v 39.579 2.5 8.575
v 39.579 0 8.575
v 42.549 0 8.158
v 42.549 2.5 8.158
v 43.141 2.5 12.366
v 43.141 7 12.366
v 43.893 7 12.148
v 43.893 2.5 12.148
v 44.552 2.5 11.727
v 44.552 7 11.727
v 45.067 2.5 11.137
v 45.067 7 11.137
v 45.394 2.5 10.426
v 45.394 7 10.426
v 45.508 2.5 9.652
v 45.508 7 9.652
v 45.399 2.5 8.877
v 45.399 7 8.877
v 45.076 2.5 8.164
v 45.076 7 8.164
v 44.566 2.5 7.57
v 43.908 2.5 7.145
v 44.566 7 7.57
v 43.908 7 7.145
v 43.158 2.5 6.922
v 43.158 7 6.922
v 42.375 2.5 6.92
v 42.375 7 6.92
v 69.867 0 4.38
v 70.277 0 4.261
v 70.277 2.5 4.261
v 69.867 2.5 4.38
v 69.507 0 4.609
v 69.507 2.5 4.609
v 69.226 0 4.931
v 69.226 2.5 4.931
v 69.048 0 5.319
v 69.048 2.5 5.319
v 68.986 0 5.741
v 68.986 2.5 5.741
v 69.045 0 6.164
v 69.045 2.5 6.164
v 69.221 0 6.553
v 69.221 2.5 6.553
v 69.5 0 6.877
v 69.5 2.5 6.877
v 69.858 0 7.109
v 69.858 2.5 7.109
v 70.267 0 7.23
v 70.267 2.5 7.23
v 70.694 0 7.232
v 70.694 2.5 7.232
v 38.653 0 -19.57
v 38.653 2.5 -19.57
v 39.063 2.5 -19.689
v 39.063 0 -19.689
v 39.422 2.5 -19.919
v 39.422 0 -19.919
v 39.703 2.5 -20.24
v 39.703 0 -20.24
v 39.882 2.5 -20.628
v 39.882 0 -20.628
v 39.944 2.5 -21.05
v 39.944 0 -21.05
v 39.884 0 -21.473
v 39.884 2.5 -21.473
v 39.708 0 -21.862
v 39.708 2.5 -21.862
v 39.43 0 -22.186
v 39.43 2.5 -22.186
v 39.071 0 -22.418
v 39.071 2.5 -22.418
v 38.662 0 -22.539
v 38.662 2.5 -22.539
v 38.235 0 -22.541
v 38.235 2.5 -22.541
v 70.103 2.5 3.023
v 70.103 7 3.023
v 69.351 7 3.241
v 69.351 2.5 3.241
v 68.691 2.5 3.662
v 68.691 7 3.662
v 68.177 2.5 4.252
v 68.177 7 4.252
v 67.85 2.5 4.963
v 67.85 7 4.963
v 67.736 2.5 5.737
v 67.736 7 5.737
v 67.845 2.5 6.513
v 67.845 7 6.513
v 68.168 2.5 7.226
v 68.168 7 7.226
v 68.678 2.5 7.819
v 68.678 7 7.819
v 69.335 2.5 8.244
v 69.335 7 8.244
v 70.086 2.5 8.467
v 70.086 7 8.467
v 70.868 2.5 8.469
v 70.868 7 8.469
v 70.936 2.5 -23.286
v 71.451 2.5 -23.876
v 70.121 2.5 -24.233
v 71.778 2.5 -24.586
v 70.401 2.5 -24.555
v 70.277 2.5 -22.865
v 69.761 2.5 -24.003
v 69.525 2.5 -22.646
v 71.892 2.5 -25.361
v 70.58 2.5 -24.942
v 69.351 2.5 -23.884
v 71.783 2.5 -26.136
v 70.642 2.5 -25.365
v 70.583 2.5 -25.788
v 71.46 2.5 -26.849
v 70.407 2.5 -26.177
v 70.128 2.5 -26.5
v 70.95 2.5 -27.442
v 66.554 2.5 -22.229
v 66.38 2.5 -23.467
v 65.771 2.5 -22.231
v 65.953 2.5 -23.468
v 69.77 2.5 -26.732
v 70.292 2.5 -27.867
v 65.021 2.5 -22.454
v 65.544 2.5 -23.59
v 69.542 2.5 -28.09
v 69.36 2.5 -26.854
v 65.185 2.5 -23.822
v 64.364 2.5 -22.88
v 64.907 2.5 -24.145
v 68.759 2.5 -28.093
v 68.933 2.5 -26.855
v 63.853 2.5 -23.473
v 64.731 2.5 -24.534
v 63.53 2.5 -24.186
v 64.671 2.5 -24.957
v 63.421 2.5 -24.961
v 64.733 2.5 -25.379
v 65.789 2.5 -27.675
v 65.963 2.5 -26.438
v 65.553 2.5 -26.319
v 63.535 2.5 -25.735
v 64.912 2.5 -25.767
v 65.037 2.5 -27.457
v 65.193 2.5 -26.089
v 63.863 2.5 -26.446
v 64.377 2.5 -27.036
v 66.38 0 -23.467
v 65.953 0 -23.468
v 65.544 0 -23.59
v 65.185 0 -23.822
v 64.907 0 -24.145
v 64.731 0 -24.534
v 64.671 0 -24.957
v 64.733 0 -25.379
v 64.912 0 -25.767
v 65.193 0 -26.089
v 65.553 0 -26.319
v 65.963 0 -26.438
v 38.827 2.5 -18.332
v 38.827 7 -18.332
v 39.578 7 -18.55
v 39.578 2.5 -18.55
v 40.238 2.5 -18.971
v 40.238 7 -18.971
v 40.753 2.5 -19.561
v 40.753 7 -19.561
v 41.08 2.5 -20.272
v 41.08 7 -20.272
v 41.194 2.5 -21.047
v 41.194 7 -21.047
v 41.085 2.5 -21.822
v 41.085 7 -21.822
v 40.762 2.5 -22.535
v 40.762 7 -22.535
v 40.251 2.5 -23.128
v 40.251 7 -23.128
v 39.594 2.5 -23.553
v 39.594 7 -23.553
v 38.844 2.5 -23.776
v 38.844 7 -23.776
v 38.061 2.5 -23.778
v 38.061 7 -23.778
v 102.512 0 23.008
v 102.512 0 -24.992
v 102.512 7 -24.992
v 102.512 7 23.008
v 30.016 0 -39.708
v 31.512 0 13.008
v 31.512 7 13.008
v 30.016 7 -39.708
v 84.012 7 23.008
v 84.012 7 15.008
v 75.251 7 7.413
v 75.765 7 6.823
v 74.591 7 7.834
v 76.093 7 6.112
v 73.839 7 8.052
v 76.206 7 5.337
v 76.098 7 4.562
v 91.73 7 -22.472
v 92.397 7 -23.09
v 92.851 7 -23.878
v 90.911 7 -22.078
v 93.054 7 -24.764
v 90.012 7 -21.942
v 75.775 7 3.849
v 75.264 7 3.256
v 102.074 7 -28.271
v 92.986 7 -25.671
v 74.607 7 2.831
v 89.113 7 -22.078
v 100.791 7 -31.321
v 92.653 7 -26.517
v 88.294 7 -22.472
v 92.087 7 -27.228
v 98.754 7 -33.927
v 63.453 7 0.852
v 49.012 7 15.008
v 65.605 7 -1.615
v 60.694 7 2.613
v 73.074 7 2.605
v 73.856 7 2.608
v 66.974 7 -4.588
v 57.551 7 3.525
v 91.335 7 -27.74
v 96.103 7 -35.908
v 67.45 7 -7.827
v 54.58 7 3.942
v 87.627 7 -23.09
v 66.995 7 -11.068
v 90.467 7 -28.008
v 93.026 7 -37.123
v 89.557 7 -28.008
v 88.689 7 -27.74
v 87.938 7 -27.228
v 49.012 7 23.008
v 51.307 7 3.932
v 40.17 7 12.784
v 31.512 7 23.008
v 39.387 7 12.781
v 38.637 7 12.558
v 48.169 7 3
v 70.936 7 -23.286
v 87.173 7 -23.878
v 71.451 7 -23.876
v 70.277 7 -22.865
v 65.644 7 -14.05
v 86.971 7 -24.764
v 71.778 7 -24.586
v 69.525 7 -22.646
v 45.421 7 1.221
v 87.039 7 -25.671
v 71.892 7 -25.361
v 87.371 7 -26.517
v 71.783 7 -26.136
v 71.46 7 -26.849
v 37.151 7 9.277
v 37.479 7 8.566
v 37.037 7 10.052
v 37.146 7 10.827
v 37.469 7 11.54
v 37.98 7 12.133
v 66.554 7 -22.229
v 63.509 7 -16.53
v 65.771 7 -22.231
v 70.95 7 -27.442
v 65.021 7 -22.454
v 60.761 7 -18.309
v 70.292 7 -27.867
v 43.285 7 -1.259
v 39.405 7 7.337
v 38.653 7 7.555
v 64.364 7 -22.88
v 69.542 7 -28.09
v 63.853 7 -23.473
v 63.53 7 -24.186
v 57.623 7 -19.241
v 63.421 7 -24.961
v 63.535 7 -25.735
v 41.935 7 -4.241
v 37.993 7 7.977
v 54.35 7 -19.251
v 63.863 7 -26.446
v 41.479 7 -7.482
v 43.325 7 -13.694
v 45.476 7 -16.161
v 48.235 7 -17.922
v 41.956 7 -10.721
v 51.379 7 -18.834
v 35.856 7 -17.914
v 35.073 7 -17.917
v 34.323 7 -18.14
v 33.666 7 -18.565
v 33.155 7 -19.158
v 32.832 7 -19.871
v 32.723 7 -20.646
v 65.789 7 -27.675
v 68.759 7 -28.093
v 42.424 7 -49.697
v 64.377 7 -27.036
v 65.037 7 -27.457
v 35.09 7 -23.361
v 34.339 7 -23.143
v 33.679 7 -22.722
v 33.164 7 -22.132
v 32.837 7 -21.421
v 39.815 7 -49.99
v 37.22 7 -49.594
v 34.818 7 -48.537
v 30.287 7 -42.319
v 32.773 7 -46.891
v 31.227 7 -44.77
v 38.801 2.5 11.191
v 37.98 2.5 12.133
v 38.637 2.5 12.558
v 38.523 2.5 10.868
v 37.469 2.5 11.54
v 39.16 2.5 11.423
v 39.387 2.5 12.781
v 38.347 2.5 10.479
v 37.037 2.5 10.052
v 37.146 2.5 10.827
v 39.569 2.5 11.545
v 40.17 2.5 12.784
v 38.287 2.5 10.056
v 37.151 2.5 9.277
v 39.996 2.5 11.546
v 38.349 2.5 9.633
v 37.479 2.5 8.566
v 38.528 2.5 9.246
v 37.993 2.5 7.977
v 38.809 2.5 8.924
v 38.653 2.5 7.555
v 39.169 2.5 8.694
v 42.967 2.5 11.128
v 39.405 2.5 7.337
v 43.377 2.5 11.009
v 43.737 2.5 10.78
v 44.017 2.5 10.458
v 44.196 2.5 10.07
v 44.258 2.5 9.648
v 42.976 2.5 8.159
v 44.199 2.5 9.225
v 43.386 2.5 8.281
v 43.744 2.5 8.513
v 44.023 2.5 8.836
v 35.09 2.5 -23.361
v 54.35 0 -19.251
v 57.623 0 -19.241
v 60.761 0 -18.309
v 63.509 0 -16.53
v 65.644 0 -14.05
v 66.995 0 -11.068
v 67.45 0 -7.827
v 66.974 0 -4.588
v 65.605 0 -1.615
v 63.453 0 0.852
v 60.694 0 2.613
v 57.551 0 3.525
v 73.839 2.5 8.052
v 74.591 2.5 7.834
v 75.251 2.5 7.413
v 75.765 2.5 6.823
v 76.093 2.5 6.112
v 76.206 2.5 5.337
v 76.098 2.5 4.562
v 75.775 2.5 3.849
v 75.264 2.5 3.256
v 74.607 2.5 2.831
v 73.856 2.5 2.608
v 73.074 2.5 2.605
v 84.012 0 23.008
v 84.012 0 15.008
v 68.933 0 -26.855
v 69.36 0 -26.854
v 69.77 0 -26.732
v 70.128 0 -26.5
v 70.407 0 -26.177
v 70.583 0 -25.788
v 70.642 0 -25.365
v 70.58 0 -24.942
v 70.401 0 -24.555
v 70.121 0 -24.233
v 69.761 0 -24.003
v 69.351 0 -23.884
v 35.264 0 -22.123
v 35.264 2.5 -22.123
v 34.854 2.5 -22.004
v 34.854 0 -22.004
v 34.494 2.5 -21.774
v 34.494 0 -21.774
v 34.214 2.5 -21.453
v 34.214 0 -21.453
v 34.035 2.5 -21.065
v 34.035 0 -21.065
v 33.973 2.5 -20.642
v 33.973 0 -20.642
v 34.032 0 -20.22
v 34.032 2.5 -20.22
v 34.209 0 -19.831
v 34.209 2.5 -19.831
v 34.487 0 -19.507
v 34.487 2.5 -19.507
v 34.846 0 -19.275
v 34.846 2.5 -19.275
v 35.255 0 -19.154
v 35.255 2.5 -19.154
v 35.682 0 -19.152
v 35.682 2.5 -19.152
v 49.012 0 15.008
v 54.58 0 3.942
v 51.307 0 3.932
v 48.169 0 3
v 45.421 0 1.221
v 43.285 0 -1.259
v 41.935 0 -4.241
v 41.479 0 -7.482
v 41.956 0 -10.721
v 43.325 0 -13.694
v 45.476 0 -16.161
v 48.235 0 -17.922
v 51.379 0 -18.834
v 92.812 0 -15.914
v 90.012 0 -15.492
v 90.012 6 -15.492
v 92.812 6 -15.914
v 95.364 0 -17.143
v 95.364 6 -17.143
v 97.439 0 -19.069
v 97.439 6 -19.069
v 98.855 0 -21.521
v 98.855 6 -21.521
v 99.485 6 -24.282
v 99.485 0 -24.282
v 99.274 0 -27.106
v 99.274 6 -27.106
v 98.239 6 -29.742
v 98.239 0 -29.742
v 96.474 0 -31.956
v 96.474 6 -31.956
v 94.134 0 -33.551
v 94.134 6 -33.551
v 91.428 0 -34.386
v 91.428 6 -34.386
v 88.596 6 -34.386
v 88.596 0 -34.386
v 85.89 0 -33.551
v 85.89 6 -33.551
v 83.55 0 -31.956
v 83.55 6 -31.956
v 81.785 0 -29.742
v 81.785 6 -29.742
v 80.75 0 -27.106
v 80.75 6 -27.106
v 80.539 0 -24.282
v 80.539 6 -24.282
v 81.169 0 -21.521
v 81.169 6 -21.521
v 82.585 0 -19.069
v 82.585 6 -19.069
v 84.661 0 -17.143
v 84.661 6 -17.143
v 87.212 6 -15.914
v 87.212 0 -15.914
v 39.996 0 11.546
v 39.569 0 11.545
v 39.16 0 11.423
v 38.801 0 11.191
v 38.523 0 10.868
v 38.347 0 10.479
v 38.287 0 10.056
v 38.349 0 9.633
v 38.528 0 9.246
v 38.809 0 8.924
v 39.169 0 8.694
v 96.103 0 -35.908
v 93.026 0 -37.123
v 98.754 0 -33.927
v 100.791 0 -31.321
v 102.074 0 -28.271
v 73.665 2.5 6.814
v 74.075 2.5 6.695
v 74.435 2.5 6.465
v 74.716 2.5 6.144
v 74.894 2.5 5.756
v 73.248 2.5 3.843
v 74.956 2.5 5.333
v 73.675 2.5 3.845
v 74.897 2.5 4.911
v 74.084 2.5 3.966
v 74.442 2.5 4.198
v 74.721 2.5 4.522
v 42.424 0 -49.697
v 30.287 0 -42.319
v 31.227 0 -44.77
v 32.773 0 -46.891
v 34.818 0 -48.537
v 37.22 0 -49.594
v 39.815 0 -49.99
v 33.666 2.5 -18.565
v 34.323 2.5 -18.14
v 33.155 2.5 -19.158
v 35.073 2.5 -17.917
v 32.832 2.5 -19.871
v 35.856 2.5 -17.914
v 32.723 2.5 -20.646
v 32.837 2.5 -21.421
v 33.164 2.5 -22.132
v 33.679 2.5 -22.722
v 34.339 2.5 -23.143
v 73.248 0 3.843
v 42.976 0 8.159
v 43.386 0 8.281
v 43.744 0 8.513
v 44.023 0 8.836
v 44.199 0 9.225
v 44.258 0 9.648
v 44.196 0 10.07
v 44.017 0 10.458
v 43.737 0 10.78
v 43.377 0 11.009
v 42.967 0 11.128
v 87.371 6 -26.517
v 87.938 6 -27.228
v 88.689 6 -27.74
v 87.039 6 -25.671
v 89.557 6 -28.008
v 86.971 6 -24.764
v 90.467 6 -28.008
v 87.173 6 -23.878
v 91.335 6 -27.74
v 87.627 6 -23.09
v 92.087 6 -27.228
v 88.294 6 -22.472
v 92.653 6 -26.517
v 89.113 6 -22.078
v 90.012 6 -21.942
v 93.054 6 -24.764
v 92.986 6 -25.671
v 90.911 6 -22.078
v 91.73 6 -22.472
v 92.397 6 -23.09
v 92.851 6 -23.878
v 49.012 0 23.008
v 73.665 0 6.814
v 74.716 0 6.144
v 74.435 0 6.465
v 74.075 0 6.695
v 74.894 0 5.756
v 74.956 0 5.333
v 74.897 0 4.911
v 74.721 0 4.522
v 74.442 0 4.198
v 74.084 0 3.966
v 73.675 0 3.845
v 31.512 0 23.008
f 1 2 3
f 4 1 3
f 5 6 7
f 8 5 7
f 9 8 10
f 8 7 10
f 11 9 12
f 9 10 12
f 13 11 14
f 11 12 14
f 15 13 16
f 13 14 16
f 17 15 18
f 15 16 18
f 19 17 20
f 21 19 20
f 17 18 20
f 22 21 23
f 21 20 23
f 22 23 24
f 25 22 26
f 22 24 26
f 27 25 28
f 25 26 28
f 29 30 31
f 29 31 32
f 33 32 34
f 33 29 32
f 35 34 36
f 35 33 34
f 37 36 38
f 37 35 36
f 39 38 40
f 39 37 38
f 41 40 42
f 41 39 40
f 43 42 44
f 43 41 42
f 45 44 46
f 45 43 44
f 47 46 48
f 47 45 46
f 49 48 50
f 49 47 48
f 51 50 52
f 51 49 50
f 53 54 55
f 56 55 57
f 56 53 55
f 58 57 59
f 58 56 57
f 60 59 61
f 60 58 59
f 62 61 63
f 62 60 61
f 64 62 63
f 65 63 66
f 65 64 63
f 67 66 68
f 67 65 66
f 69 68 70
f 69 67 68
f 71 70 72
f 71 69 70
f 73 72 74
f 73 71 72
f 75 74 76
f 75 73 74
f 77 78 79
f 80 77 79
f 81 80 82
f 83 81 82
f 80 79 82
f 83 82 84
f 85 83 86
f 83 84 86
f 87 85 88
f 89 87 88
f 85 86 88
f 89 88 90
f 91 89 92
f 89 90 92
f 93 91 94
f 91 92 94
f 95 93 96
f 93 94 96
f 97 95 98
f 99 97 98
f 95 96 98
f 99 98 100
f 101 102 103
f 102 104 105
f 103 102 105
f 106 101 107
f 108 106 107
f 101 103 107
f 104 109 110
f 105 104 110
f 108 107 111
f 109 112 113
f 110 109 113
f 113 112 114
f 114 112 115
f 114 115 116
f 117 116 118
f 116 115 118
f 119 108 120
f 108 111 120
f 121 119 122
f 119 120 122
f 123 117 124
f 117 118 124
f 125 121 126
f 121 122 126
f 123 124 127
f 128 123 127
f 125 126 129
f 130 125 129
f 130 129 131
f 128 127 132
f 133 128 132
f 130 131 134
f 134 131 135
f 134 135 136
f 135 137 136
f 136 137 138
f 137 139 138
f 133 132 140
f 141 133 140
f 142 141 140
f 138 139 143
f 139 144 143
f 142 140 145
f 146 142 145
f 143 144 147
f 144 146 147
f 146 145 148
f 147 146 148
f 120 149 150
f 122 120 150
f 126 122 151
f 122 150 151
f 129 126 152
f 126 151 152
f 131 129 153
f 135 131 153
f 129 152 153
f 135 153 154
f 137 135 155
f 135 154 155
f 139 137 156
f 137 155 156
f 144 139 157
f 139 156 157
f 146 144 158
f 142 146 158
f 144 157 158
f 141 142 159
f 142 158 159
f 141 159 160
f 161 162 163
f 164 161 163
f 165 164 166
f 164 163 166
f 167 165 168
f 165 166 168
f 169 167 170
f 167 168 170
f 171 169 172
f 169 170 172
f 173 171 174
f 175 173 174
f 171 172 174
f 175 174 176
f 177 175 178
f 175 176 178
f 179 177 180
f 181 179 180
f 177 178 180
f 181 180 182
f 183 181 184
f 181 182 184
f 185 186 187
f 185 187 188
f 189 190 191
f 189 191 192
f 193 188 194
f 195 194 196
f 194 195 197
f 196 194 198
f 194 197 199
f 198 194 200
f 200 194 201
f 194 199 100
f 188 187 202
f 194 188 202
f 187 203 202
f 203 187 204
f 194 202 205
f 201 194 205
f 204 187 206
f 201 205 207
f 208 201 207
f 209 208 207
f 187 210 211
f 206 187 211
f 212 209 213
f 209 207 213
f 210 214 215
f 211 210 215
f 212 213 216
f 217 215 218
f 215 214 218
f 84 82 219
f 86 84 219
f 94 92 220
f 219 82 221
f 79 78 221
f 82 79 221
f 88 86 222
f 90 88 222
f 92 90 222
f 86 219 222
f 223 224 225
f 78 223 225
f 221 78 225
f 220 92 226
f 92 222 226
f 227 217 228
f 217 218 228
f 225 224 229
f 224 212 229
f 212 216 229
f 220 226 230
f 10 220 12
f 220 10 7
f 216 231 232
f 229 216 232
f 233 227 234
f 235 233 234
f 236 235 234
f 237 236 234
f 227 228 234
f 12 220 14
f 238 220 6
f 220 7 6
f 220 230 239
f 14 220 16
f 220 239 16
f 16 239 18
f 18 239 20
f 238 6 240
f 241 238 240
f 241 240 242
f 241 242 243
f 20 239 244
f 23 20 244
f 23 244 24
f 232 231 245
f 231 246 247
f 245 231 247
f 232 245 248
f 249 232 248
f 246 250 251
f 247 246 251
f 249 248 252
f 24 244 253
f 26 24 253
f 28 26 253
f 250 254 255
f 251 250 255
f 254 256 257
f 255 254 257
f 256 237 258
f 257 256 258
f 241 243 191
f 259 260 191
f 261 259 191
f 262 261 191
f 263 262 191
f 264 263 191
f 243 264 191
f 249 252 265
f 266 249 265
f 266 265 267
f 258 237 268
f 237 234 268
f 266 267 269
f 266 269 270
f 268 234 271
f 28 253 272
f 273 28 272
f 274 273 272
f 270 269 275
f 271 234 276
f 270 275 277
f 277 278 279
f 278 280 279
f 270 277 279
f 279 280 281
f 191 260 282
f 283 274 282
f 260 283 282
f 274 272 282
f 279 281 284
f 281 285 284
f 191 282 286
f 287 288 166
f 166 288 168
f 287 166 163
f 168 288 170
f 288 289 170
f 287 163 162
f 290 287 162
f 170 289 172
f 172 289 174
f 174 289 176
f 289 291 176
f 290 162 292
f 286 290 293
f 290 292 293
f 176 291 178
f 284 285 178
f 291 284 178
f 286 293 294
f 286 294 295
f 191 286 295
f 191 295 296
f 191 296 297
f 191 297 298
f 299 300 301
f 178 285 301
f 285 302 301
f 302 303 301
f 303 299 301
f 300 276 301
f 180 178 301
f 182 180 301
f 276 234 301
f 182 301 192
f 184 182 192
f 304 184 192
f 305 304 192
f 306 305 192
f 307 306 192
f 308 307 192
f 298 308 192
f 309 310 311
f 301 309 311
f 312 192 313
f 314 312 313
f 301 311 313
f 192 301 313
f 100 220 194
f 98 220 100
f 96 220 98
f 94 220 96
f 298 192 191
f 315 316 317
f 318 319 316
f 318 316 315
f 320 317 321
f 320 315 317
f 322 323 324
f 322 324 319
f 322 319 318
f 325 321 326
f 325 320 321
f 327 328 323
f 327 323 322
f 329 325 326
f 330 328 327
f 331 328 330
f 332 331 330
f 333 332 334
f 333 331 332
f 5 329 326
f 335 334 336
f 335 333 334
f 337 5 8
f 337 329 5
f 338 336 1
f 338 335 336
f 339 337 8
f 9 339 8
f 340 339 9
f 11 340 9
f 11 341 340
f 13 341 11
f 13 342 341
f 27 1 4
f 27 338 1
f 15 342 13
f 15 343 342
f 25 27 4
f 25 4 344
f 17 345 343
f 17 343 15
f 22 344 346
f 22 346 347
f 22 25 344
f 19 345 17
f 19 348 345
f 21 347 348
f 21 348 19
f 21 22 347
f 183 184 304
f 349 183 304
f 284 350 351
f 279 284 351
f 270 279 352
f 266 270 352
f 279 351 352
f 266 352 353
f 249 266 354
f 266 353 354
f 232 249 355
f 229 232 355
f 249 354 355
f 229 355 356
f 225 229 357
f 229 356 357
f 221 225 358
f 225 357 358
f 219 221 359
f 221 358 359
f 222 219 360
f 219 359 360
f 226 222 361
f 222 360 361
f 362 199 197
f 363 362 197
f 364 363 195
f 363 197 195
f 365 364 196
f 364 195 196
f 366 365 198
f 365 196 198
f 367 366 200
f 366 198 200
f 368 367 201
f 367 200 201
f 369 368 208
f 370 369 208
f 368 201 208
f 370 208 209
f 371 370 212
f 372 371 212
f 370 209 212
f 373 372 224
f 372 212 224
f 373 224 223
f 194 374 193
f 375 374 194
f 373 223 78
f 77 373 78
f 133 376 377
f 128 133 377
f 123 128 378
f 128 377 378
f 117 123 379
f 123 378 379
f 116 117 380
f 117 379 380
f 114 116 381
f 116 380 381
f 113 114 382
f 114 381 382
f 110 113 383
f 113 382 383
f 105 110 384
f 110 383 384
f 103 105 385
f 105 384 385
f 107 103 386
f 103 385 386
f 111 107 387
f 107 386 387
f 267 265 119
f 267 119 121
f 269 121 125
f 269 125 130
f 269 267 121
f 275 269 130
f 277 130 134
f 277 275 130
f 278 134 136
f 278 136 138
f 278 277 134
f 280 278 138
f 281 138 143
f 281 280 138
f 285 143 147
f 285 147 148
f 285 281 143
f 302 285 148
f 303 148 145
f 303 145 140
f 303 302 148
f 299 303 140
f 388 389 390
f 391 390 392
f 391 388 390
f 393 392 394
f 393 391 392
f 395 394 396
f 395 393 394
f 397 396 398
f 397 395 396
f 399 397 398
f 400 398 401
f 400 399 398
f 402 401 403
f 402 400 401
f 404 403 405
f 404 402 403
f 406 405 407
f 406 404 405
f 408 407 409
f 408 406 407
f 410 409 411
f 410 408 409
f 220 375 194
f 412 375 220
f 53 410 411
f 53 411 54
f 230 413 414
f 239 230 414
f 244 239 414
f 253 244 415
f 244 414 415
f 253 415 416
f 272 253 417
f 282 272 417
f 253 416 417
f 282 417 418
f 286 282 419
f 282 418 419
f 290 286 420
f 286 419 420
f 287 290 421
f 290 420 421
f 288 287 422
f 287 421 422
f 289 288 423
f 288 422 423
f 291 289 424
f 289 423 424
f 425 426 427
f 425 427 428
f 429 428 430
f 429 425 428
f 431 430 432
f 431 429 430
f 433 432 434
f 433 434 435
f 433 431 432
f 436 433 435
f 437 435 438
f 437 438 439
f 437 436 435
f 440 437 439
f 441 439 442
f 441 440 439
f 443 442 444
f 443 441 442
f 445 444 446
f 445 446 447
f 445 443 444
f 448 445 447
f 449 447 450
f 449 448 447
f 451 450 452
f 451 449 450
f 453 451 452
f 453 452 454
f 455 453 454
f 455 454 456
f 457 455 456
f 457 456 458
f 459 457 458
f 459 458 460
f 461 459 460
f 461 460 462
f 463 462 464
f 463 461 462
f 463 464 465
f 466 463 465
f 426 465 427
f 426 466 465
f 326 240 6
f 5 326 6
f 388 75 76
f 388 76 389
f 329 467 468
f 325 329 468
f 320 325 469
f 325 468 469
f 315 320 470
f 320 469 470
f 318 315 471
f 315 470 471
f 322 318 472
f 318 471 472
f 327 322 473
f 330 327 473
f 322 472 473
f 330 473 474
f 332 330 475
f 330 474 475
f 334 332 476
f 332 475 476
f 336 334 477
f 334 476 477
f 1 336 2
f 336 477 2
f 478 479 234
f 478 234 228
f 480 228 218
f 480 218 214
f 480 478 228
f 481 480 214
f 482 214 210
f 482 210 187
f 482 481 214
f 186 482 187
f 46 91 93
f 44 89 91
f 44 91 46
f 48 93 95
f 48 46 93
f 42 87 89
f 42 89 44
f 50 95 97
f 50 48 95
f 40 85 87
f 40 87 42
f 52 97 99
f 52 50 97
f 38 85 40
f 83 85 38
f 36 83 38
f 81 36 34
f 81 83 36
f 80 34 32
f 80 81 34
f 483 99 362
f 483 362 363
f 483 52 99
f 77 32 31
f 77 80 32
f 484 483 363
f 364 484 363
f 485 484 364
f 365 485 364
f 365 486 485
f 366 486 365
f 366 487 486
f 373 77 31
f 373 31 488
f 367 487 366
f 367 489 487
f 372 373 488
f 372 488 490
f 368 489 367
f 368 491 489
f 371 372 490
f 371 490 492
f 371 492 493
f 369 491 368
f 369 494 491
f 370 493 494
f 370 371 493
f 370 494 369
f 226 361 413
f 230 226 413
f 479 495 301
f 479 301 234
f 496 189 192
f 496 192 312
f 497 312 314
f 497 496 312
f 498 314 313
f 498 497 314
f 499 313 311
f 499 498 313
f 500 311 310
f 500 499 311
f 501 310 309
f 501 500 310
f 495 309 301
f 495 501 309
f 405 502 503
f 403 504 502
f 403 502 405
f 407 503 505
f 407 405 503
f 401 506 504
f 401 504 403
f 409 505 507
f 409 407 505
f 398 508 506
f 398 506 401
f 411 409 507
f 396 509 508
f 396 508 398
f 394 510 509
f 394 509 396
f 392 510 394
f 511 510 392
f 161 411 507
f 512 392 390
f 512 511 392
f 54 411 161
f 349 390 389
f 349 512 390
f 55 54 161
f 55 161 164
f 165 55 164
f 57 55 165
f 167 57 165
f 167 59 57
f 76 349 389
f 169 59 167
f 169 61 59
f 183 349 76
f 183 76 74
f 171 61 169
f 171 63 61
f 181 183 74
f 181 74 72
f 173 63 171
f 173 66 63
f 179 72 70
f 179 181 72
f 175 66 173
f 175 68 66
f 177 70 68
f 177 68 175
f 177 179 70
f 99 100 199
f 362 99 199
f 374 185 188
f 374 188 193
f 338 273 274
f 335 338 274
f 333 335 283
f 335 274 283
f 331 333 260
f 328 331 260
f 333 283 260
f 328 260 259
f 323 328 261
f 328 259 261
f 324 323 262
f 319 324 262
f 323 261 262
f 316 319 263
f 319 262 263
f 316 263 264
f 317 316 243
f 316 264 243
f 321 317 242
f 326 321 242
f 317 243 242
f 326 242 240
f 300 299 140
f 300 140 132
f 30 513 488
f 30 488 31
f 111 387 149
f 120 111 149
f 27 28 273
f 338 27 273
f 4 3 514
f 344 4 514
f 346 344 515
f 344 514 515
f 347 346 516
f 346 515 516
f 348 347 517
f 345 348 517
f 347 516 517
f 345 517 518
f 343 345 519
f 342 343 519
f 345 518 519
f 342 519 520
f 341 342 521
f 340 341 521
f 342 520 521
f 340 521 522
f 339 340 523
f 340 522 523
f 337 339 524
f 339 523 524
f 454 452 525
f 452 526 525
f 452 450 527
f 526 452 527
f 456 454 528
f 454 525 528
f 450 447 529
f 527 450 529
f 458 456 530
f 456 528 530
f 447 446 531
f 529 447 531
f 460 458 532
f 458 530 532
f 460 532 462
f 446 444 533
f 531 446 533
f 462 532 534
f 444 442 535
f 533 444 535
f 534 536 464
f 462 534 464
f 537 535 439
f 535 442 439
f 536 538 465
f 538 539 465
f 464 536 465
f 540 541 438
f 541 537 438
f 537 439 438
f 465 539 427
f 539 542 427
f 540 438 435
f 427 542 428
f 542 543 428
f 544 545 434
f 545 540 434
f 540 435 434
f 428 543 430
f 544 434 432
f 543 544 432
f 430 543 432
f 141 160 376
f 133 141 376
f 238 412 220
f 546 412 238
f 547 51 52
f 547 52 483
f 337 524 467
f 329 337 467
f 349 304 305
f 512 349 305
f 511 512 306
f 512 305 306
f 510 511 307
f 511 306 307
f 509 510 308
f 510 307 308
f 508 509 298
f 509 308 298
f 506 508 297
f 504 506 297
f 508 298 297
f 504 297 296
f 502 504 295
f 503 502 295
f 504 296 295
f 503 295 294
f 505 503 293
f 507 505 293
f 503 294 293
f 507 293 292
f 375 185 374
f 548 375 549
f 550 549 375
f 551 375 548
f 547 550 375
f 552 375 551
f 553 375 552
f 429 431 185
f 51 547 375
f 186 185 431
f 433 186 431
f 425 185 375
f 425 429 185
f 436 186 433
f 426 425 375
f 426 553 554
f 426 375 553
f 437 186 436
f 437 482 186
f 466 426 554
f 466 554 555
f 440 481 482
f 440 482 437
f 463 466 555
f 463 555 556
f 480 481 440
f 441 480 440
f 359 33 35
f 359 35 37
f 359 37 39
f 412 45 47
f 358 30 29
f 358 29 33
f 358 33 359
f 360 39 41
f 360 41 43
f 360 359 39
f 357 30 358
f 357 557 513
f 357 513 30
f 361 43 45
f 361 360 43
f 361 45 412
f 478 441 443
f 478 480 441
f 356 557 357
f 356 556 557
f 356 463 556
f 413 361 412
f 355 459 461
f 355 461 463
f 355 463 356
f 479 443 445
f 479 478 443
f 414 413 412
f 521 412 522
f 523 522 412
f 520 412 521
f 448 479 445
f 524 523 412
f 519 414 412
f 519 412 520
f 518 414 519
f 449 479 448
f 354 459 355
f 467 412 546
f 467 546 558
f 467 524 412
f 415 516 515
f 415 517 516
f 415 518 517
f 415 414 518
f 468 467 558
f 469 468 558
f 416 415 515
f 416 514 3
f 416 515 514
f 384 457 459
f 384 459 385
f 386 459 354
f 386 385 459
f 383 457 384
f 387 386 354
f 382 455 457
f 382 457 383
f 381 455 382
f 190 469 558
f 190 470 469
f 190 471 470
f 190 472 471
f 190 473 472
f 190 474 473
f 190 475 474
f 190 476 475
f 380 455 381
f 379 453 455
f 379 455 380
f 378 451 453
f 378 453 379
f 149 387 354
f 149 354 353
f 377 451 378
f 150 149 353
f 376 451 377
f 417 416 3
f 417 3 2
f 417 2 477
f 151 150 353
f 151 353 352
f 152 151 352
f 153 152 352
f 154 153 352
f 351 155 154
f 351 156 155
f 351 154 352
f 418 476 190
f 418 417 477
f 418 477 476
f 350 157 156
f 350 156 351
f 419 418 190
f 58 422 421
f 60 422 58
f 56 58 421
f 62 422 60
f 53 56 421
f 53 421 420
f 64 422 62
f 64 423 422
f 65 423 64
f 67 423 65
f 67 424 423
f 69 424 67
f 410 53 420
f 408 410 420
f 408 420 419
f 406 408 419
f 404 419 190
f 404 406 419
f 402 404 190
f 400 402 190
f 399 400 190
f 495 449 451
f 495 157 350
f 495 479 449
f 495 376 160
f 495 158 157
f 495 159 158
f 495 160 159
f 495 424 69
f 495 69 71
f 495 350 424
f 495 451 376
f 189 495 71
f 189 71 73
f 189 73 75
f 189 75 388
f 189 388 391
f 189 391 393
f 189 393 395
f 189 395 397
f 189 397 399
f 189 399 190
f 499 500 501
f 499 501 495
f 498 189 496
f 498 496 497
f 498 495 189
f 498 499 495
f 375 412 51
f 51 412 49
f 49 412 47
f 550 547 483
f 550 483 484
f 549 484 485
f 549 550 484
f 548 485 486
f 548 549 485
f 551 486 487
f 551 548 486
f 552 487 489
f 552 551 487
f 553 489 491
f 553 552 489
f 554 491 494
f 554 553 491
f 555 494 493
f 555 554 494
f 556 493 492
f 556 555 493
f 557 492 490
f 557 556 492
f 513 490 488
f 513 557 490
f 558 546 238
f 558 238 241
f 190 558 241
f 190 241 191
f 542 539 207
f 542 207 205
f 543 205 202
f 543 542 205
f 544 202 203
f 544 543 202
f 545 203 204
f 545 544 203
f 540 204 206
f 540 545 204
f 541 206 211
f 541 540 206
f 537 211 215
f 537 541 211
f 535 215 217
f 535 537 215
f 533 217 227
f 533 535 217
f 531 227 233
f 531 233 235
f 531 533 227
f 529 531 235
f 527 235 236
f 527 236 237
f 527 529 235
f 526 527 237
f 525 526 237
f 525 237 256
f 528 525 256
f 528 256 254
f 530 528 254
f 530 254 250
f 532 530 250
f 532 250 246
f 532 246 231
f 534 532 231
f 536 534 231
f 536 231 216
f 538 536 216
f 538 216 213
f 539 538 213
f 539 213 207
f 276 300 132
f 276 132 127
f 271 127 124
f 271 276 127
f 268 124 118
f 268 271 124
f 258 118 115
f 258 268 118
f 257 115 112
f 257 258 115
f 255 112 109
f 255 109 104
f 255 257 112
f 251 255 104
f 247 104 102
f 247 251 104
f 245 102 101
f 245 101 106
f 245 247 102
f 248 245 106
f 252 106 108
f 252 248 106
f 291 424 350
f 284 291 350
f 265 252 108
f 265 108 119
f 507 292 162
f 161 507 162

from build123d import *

# Parameters (mm, degrees)
SKETCH2_R           = 3.05
BOSS_EXTRUDE1_DEPTH = 7
SKETCH2_7_R         = 9.5
SKETCH2_7_R_2       = 3.05
CUT_EXTRUDE1_DEPTH  = 6
CUT_EXTRUDE2_START  = 7
CUT_EXTRUDE2_DEPTH  = 4.5


with BuildPart() as part:
    # Sketch2 → Boss-Extrude1 (new body)
    with BuildSketch(Plane(origin=(0, 0, 0), x_dir=(1, 0, 0), z_dir=(0, 1, 0))):
        with BuildLine():
            Line((102.512048312, 24.992099408), (102.512048312, -23.007900592))
            Line((102.512048312, -23.007900592), (84.012048312, -23.007900592))
            Line((84.012048312, -23.007900592), (84.012048312, -15.007900592))
            Line((84.012048312, -15.007900592), (49.012048312, -15.007900592))
            Line((49.012048312, -15.007900592), (49.012048312, -23.007900592))
            Line((49.012048312, -23.007900592), (31.512048312, -23.007900592))
            Line((31.512048312, -23.007900592), (31.512048312, -13.007900592))
            Line((31.512048312, -13.007900592), (30.016072392, 39.708435169))
            ThreePointArc((30.016072392, 39.708435169), (33.741164308, 47.78158038), (42.423514406, 49.696986387))
            Line((42.423514406, 49.696986387), (93.026380929, 37.123208132))
            ThreePointArc((93.026380929, 37.123208132), (99.859107713, 32.691802074), (102.512048312, 24.992099408))
        make_face()
        with Locations(Location((90.012048312, 24.992099408, 0), (0, 0, 270))):
            Circle(SKETCH2_R, mode=Mode.SUBTRACT)
        with BuildLine():
            Line((51.378851017, 18.833843692), (54.349655223, 19.251362995))
            ThreePointArc((54.349655223, 19.251362995), (67.338228674, 9.463770865), (57.550636545, -3.524802586))
            Line((57.550636545, -3.524802586), (54.579832339, -3.942321889))
            ThreePointArc((54.579832339, -3.942321889), (41.591258887, 5.84527024), (51.378851017, 18.833843692))
        make_face(mode=Mode.SUBTRACT)
        with BuildLine():
            Line((65.962554027, 26.437501135), (68.933358233, 26.855020438))
            ThreePointArc((68.933358233, 26.855020438), (70.627519988, 25.578377986), (69.350877536, 23.884216232))
            Line((69.350877536, 23.884216232), (66.38007333, 23.466696929))
            ThreePointArc((66.38007333, 23.466696929), (64.685911575, 24.74333938), (65.962554027, 26.437501135))
        make_face(mode=Mode.SUBTRACT)
        with BuildLine():
            Line((70.694439459, -7.231613202), (73.665243666, -6.814093899))
            ThreePointArc((73.665243666, -6.814093899), (74.941886117, -5.119932145), (73.247724363, -3.843289693))
            Line((73.247724363, -3.843289693), (70.276920157, -4.260808996))
            ThreePointArc((70.276920157, -4.260808996), (69.000277705, -5.954970751), (70.694439459, -7.231613202))
        make_face(mode=Mode.SUBTRACT)
        with BuildLine():
            Line((42.966933535, -11.128460029), (39.996129329, -11.545979332))
            ThreePointArc((39.996129329, -11.545979332), (38.301967574, -10.26933688), (39.578610026, -8.575175126))
            Line((39.578610026, -8.575175126), (42.549414232, -8.157655823))
            ThreePointArc((42.549414232, -8.157655823), (44.243575986, -9.434298275), (42.966933535, -11.128460029))
        make_face(mode=Mode.SUBTRACT)
        with BuildLine():
            Line((38.235048102, 22.540654308), (35.264243896, 22.123135005))
            ThreePointArc((35.264243896, 22.123135005), (33.987601444, 20.428973251), (35.681763199, 19.152330799))
            Line((35.681763199, 19.152330799), (38.652567405, 19.569850102))
            ThreePointArc((38.652567405, 19.569850102), (39.929209857, 21.264011856), (38.235048102, 22.540654308))
        make_face(mode=Mode.SUBTRACT)
    extrude(amount=BOSS_EXTRUDE1_DEPTH)

    # Sketch2<7> → Cut-Extrude1 (cut)
    with BuildSketch(Plane(origin=(0, 0, 0), x_dir=(1, 0, 0), z_dir=(0, 1, 0))):
        with Locations(Location((90.012048312, 24.992099408, 0), (0, 0, 270))):
            Circle(SKETCH2_7_R)
        with Locations(Location((90.012048312, 24.992099408, 0), (0, 0, 270))):
            Circle(SKETCH2_7_R_2, mode=Mode.SUBTRACT)
    extrude(amount=CUT_EXTRUDE1_DEPTH, mode=Mode.SUBTRACT)

    # Sketch2<8> → Cut-Extrude2 (cut)
    with BuildSketch(Plane(origin=(0, 0, 0), x_dir=(1, 0, 0), z_dir=(0, 1, 0)).offset(CUT_EXTRUDE2_START)):
        with BuildLine():
            Line((65.788587651, 27.675336221), (68.759391857, 28.092855524))
            ThreePointArc((68.759391857, 28.092855524), (71.865355074, 25.752344362), (69.524843912, 22.646381146))
            Line((69.524843912, 22.646381146), (66.554039706, 22.228861843))
            ThreePointArc((66.554039706, 22.228861843), (63.448076489, 24.569373004), (65.788587651, 27.675336221))
        make_face()
        with BuildLine():
            Line((70.868405836, -8.469448288), (73.839210042, -8.051928985))
            ThreePointArc((73.839210042, -8.051928985), (76.179721203, -4.945965769), (73.073757987, -2.605454607))
            Line((73.073757987, -2.605454607), (70.10295378, -3.02297391))
            ThreePointArc((70.10295378, -3.02297391), (67.762442619, -6.128937127), (70.868405836, -8.469448288))
        make_face()
        with BuildLine():
            Line((38.061081726, 23.778489394), (35.09027752, 23.360970091))
            ThreePointArc((35.09027752, 23.360970091), (32.749766358, 20.255006874), (35.855729575, 17.914495713))
            Line((35.855729575, 17.914495713), (38.826533781, 18.332015016))
            ThreePointArc((38.826533781, 18.332015016), (41.167044943, 21.437978232), (38.061081726, 23.778489394))
        make_face()
        with BuildLine():
            Line((42.375447856, -6.919820737), (39.404643649, -7.33734004))
            ThreePointArc((39.404643649, -7.33734004), (37.064132488, -10.443303257), (40.170095705, -12.783814418))
            Line((40.170095705, -12.783814418), (43.140899911, -12.366295115))
            ThreePointArc((43.140899911, -12.366295115), (45.481411072, -9.260331898), (42.375447856, -6.919820737))
        make_face()
    extrude(amount=-CUT_EXTRUDE2_DEPTH, mode=Mode.SUBTRACT)


solid = part.part
